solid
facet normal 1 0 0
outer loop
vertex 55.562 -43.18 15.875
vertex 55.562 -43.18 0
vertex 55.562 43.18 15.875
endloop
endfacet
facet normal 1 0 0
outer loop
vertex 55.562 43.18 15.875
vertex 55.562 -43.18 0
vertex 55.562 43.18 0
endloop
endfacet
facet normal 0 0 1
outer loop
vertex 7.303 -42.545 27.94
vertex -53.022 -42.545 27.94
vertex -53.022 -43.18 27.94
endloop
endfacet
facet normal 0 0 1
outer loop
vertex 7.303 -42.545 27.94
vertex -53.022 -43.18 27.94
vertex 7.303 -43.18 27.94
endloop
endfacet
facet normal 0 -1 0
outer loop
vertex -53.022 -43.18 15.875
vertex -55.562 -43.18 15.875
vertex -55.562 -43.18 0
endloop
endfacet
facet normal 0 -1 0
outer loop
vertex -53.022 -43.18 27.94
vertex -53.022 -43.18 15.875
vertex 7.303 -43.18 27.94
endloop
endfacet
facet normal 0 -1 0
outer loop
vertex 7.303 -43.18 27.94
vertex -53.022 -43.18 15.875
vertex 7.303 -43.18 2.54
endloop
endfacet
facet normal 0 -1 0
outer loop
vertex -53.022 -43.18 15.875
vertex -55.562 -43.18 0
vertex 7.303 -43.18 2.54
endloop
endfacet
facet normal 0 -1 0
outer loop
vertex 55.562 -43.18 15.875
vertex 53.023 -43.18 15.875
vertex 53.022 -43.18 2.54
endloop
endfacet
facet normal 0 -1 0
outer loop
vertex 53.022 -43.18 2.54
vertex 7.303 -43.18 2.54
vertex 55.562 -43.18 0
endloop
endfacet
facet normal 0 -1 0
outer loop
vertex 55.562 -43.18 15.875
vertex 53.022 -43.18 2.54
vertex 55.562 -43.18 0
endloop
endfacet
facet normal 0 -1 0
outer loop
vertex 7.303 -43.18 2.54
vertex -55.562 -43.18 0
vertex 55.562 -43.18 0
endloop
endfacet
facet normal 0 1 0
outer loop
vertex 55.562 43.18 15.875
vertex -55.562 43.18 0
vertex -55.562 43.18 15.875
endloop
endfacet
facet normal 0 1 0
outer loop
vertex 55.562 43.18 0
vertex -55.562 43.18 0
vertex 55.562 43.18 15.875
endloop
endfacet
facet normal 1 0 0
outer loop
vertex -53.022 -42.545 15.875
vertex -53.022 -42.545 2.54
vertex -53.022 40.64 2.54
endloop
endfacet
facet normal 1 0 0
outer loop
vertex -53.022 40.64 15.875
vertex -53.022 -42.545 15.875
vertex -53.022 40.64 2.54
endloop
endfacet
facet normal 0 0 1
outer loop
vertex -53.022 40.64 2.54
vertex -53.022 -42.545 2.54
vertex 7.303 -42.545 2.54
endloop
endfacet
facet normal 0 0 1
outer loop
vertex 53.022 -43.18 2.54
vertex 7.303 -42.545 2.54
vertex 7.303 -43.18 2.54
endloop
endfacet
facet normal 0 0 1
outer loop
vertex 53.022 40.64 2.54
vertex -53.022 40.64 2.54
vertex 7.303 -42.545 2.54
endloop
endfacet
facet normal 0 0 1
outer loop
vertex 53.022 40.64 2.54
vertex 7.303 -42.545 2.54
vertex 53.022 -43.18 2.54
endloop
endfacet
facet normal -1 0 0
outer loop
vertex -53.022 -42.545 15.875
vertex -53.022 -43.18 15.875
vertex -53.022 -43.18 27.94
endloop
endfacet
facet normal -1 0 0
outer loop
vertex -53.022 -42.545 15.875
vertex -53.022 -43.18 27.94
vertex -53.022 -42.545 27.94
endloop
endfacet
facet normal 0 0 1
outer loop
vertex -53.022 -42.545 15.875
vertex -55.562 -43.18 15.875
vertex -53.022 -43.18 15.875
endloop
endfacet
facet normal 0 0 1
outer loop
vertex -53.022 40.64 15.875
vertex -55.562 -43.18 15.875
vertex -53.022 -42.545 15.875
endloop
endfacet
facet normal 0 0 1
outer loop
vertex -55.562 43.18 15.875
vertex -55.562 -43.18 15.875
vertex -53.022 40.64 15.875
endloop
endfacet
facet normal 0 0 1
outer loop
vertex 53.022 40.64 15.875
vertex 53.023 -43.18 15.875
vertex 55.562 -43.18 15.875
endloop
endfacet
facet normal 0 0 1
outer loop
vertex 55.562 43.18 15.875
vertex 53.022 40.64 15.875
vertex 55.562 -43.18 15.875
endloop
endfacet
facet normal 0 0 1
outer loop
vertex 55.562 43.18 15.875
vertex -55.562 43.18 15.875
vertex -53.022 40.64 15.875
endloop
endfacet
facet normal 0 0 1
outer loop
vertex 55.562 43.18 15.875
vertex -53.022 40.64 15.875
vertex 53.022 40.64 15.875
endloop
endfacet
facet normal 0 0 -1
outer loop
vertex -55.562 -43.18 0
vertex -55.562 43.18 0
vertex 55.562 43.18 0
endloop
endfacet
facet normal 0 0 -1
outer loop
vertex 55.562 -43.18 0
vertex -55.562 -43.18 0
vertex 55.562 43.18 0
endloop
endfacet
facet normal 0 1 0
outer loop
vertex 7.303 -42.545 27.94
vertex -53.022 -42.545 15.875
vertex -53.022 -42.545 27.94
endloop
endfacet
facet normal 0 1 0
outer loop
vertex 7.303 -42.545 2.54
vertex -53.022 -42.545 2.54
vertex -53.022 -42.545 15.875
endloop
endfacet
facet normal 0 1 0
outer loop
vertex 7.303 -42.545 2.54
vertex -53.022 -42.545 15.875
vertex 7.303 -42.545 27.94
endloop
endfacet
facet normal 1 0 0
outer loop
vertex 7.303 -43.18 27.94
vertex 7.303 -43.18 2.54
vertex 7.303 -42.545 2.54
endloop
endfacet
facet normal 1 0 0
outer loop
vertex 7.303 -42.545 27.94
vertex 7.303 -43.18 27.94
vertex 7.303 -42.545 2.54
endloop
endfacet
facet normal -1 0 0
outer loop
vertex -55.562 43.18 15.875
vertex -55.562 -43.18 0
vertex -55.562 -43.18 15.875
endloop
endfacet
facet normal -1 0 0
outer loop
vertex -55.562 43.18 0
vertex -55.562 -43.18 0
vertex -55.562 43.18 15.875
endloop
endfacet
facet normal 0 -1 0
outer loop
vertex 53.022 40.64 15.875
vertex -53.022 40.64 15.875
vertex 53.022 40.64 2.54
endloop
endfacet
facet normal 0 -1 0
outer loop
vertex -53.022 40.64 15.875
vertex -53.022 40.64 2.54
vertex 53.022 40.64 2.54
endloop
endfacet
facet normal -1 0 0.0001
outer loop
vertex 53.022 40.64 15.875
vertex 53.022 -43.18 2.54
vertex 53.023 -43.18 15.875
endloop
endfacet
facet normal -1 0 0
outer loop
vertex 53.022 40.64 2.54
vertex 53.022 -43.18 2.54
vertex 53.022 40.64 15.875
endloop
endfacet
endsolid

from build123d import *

# Parameters (mm, degrees)
F0_W     = 111.125
F0_H     = 86.36
F1_DEPTH = 15.875
F2_T     = -2.54
F3_W     = 60.325
F3_H     = 0.635
F4_DEPTH = 25.4


with BuildPart() as f1:
    # F0 (on Top) → F1 (new body)
    with BuildSketch(Plane.XY):
        Rectangle(F0_W, F0_H)
    extrude(amount=F1_DEPTH)

    # F2
    f2_openings = [f1.faces().sort_by_distance(p)[0] for p in [
        (0, 0, 15.875),
        (0, -43.18, 7.9375),
    ]]
    offset(amount=F2_T, openings=f2_openings)

    # F3 (on face) → F4 (join)
    with BuildSketch(Plane.XY.offset(2.54)):
        with Locations((-22.86, -42.8625)):
            Rectangle(F3_W, F3_H)
    extrude(amount=F4_DEPTH)


solid = f1.part
